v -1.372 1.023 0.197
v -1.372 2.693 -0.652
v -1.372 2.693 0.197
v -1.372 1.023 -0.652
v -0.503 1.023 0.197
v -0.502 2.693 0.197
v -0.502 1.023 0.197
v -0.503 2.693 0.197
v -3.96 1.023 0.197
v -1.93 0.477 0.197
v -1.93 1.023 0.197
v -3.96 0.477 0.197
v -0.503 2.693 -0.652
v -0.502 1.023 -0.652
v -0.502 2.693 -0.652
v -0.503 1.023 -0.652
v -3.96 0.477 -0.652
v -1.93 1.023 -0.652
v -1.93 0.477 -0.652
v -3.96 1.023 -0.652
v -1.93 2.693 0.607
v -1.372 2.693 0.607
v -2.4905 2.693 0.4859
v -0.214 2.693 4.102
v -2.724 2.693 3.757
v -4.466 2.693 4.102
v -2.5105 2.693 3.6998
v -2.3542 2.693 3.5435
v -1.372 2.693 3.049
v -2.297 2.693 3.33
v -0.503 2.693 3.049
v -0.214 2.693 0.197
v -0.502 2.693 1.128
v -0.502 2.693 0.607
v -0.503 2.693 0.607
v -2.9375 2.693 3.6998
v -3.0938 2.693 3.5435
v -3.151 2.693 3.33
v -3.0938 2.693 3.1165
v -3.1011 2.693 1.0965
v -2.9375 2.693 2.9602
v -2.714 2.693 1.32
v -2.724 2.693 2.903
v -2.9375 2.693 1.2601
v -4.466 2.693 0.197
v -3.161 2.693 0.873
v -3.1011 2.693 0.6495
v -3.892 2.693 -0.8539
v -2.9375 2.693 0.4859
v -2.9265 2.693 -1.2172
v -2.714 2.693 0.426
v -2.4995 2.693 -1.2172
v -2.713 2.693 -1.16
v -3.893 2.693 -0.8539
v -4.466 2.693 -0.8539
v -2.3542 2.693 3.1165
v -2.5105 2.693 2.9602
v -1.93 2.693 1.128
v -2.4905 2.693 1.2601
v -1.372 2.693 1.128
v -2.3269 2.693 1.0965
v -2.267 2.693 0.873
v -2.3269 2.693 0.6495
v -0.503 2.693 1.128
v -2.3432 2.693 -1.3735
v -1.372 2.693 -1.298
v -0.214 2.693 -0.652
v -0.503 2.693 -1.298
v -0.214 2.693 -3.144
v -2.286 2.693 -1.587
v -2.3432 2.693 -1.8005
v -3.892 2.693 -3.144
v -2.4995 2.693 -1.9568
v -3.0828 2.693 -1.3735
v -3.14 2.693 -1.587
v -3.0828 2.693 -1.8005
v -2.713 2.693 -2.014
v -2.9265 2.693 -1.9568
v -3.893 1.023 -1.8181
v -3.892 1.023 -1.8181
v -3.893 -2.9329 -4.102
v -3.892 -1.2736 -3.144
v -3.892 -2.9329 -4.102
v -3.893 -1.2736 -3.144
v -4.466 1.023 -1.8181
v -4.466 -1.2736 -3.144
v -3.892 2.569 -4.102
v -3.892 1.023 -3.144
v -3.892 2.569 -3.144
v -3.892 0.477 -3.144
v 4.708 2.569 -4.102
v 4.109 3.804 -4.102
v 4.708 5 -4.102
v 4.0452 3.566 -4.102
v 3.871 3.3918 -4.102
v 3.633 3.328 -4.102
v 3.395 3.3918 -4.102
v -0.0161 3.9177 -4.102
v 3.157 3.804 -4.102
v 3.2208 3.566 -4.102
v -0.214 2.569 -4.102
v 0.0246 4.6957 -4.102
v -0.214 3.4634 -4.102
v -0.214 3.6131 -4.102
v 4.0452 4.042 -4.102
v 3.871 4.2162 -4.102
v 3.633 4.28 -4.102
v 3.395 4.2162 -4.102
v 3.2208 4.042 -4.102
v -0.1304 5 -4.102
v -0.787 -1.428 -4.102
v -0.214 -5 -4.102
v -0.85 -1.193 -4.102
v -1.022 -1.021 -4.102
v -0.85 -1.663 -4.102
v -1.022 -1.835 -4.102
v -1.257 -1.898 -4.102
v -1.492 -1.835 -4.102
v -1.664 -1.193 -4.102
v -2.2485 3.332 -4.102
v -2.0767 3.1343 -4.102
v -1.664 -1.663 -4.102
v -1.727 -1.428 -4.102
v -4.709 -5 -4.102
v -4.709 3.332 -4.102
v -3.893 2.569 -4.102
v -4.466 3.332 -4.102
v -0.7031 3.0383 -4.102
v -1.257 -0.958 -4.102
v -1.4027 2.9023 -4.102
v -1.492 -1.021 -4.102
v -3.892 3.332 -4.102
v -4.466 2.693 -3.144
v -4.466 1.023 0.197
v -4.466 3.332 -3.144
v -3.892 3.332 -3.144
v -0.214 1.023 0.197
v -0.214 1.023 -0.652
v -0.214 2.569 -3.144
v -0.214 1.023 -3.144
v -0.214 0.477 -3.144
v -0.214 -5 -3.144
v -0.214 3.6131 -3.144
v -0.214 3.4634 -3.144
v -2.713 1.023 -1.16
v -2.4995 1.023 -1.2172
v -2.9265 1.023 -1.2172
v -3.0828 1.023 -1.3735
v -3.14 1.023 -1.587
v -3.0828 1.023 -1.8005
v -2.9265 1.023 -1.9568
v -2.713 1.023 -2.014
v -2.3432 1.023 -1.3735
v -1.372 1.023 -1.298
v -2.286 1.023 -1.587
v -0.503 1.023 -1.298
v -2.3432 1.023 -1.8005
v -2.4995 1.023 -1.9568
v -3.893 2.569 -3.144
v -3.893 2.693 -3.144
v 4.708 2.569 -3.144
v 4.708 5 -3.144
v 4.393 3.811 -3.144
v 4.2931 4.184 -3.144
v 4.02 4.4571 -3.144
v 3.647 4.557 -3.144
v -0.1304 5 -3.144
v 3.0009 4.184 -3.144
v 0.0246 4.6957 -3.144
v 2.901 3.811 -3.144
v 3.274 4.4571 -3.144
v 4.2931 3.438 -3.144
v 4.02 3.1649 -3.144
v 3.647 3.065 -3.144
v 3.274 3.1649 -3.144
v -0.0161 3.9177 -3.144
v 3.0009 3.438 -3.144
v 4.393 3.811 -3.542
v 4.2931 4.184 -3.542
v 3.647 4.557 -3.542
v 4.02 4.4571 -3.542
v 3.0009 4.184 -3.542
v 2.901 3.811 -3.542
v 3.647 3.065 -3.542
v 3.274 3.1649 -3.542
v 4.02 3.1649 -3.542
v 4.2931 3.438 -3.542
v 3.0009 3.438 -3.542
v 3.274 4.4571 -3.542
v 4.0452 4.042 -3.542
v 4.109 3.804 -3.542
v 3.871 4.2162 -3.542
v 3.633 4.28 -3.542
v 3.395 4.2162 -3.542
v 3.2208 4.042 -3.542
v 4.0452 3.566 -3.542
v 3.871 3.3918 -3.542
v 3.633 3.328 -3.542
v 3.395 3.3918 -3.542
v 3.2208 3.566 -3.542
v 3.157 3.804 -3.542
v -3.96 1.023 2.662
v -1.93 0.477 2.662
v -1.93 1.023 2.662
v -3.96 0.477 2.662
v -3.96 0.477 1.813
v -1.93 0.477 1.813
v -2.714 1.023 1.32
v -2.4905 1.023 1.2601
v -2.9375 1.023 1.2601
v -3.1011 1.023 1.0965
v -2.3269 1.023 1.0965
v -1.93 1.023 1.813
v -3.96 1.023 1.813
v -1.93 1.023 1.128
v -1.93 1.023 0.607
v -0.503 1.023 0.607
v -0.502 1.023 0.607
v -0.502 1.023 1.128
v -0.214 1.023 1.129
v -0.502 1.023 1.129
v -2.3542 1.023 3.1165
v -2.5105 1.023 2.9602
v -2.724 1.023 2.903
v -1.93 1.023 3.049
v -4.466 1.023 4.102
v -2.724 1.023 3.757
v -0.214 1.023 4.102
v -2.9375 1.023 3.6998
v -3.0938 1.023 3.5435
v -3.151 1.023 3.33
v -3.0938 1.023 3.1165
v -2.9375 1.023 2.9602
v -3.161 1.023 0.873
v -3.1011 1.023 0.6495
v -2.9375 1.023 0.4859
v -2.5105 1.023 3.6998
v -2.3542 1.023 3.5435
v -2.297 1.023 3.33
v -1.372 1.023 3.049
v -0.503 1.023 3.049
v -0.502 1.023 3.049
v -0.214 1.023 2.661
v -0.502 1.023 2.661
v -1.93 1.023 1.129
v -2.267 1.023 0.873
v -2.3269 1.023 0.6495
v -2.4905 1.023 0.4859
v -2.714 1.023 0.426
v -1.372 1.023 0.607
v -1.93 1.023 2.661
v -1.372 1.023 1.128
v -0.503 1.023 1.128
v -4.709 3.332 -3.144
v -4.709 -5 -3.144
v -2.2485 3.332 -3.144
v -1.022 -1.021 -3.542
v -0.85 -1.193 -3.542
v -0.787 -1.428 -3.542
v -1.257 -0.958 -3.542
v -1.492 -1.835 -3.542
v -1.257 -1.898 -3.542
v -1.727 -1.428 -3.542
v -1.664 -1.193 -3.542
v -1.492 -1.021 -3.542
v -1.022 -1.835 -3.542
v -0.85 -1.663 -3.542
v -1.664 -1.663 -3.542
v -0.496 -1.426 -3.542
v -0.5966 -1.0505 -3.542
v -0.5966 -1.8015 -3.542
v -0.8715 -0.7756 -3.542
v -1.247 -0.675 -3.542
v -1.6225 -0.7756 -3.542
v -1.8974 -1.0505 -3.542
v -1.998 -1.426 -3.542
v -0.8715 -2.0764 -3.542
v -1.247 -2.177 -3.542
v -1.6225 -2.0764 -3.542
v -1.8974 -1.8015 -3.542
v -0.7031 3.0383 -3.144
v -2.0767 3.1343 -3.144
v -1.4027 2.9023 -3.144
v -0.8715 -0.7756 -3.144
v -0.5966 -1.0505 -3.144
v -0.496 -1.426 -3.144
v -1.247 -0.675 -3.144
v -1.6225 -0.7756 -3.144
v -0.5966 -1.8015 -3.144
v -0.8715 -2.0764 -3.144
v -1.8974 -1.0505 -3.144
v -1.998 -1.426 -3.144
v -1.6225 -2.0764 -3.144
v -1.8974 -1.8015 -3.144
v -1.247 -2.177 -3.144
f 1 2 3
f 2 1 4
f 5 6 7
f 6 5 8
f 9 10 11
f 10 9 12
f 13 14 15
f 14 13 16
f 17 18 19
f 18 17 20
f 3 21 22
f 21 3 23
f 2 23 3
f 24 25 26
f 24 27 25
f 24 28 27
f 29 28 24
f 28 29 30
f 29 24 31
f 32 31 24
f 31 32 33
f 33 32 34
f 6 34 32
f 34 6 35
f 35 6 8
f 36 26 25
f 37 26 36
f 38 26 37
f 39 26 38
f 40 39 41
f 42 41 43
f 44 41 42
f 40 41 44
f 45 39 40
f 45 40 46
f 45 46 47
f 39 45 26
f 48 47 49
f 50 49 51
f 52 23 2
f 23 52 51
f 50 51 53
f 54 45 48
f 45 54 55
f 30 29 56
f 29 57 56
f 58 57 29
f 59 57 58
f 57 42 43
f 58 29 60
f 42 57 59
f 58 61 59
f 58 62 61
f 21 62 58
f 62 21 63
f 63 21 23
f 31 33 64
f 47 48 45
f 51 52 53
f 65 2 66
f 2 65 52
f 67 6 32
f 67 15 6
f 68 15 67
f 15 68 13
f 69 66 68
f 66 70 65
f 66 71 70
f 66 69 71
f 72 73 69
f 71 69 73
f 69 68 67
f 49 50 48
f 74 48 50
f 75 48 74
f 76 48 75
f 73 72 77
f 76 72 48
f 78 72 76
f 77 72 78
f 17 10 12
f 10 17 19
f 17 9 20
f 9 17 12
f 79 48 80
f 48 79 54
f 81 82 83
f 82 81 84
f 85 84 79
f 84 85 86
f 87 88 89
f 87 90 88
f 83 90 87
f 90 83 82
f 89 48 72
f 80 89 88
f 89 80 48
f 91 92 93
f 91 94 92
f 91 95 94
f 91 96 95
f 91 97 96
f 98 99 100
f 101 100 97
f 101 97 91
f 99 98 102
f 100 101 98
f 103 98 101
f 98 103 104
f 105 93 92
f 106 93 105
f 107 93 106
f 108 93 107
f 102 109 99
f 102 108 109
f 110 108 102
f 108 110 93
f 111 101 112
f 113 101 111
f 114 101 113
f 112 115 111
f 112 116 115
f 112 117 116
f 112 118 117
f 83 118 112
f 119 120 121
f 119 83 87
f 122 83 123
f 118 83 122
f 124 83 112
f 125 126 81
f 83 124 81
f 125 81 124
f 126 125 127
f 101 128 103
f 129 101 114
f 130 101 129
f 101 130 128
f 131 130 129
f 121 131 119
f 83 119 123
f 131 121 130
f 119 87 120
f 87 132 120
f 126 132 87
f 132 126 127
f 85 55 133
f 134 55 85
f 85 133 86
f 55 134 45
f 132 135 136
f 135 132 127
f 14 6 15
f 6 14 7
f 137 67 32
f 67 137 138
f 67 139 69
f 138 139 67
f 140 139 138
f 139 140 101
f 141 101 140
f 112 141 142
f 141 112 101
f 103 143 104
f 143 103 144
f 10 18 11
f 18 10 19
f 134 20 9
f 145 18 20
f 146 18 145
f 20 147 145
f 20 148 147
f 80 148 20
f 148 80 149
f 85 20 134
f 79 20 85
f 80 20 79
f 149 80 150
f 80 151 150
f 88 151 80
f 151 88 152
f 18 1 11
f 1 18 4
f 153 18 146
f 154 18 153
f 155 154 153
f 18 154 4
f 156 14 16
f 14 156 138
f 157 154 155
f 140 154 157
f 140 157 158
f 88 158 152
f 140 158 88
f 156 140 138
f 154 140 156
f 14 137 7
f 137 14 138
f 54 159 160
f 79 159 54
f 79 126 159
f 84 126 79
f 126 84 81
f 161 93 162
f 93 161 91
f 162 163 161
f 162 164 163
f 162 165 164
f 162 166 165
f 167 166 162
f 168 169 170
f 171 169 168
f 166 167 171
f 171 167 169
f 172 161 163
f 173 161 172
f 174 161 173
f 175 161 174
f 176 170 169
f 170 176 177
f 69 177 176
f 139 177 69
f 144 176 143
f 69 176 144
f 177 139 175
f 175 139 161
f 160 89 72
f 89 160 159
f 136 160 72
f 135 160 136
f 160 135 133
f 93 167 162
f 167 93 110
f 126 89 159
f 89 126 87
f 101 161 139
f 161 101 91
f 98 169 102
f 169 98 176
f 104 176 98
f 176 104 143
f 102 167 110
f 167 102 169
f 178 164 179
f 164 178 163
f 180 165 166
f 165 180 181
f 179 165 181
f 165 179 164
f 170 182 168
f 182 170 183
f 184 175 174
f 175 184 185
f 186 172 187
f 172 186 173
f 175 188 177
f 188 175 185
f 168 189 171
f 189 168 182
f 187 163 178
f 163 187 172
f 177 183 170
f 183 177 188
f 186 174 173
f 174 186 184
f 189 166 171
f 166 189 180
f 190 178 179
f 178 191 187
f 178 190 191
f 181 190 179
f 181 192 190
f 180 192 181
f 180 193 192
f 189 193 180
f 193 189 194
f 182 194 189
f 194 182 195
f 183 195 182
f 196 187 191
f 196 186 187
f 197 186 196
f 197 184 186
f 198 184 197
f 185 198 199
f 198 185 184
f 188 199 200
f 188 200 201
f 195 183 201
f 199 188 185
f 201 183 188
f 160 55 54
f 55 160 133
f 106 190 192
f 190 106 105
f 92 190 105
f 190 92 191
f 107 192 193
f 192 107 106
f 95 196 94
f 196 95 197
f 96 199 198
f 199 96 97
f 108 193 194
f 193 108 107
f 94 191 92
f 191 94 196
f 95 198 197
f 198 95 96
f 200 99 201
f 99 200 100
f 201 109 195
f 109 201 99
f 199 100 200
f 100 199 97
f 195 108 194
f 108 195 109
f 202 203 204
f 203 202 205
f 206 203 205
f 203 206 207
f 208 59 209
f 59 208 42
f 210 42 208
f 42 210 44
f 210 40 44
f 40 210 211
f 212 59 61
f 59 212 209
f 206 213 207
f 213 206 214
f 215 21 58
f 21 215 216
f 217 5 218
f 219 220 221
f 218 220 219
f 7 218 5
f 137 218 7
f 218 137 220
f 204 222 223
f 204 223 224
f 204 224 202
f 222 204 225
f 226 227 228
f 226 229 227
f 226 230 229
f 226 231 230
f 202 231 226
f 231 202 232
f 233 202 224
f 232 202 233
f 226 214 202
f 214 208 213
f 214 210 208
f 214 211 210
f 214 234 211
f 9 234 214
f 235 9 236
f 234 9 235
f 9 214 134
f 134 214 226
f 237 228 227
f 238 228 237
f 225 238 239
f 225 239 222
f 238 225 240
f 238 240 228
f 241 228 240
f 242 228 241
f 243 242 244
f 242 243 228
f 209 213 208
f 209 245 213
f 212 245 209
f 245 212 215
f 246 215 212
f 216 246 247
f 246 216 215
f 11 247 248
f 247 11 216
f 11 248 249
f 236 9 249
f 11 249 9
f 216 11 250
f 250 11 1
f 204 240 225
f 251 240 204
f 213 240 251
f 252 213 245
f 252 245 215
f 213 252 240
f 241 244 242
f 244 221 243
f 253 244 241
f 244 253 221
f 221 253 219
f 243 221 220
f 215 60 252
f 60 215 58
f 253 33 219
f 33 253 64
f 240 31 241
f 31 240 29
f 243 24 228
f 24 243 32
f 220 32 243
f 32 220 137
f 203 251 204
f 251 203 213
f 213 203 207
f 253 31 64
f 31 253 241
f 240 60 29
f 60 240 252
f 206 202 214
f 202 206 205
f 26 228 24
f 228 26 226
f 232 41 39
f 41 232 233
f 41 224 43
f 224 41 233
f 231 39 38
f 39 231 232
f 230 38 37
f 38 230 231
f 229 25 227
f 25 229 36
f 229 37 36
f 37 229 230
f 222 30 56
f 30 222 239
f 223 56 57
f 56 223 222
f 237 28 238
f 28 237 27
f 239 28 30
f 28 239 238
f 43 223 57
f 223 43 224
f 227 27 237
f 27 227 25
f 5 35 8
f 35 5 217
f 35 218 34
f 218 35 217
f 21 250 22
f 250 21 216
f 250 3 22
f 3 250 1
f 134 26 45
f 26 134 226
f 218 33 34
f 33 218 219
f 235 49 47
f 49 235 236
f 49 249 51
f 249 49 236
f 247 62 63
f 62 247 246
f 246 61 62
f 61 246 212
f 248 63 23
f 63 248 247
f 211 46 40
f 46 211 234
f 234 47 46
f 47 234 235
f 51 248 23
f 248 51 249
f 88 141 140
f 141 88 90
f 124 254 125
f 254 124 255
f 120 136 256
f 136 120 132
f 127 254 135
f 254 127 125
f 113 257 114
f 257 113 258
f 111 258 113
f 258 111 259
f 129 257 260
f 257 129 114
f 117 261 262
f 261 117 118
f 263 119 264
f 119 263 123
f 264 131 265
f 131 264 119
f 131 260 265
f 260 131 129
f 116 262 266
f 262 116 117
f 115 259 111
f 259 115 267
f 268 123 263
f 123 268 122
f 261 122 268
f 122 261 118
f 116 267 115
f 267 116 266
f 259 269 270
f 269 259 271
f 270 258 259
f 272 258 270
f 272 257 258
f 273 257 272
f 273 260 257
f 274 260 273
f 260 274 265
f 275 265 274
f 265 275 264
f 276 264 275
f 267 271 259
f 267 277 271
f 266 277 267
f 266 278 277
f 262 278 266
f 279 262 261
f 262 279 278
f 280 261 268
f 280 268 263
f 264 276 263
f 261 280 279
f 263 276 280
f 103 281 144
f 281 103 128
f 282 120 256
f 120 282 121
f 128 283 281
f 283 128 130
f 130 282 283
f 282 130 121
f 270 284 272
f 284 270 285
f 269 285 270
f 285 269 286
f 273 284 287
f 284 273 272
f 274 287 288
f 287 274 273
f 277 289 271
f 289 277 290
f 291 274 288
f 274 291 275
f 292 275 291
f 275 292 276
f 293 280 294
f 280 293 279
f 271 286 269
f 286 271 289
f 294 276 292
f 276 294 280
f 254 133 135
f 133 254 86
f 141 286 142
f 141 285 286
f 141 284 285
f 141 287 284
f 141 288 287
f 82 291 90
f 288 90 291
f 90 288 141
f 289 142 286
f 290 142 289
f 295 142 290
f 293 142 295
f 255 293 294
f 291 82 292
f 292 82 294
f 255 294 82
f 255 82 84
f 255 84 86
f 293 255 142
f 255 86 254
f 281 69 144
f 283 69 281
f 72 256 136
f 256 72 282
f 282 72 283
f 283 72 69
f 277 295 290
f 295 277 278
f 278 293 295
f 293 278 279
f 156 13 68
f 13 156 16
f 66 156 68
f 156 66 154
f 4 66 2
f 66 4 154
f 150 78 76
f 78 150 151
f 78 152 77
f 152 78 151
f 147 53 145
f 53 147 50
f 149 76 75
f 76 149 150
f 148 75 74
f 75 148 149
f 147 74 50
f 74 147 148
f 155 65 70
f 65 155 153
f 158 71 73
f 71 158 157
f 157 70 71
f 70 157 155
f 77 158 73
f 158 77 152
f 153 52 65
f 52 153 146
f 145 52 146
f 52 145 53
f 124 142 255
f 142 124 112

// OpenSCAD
intersection() {
translate([-5.65, -6, -4.923]) cube(size = [11.301, 12, 9.846], center = false);
union() {
difference() {
union() {
translate([-0.502, -5, -0.652]) cube(size = [5.211, 7.693, 0.849], center = false);
intersection() {
translate([-18.2, 0.477, -0.652]) cube(size = [16.828, 2.216, 0.849], center = false);
rotate([90, 0, 0])
translate([-3.96, -18.2, -18.2]) cube(size = [22.16, 36.4, 36.4], center = false);
}
rotate([-180, 0, 0])
translate([-0.214, -18.2, 1.298]) cube(size = [18.414, 36.4, 2.804], center = false);
intersection() {
rotate([-150, 0, 0])
translate([-18.2, -18.2, 2.086]) cube(size = [17.986, 36.4, 16.114], center = false);
translate([-4.466, -5, -4.102]) cube(size = [0.574, 8.332, 3.45], center = false);
}
translate([-1.247, -1.426, -18.2])
cylinder(h = 14.098, r1 = 0.751, r2 = 0.751, center = false, $fn = 12);
}
union() {
rotate([180, 0, 180])
translate([-3.647, 3.811, -18.2])
cylinder(h = 21.742, r1 = 0.746, r2 = 0.746, center = false, $fn = 12);
translate([-4.466, 2.693, -3.144]) cube(size = [22.666, 0.639, 2.492], center = false);
translate([3.633, 3.804, -4.102])
cylinder(h = 0.56, r1 = 0.476, r2 = 0.476, center = false, $fn = 12);
difference() {
union() {
rotate([90, 0, 0])
translate([-1.93, -18.2, -1.023]) cube(size = [20.13, 36.4, 19.222], center = false);
rotate([30, 0, 0])
translate([-3.893, -18.2, -18.2]) cube(size = [22.093, 36.4, 16.114], center = false);
}
difference() {
translate([-3.893, 2.569, -18.2]) cube(size = [8.601, 2.431, 15.056], center = false);
rotate([0, 0, 72])
translate([3.721, 2.731, -18.2])
cylinder(h = 36.4, r1 = 1.505, r2 = 1.505, center = false, $fn = 12);
}
}
rotate([-180, 0, 0])
translate([-0.214, -18.2, -0.197]) cube(size = [18.414, 36.4, 3.341], center = false);
}
}
difference() {
union() {
intersection() {
difference() {
translate([-4.466, 0.477, 1.129]) cube(size = [3.095, 17.723, 1.533], center = false);
rotate([180, 90, -90])
translate([-0.873, 2.714, -18.2])
cylinder(h = 36.4, r1 = 0.447, r2 = 0.447, center = false, $fn = 12);
}
union() {
translate([-18.2, 0.477, 1.813]) cube(size = [16.828, 2.216, 1.237], center = false);
rotate([90, 0, 0])
translate([-18.2, -18.2, -2.693]) cube(size = [16.27, 36.4, 1.67], center = false);
}
}
intersection() {
translate([0, 0, 0]) sphere(r = 54.6, $fn = 12);
rotate([180, 90, -90])
translate([-0.873, 2.714, -18.2])
cylinder(h = 18.677, r1 = 0.447, r2 = 0.447, center = false, $fn = 12);
}
intersection() {
rotate([90, 0, 0])
translate([-1.93, -18.2, -2.693]) cube(size = [20.13, 36.4, 1.67], center = false);
rotate([180, 0, 0])
translate([-18.2, -18.2, -3.049]) cube(size = [17.986, 36.4, 1.921], center = false);
}
}
intersection() {
union() {
rotate([90, 0, 0])
translate([-1.93, -18.2, -1.023]) cube(size = [20.13, 36.4, 19.222], center = false);
rotate([90, 0, 0])
translate([-18.2, -18.2, -0.477]) cube(size = [36.4, 36.4, 18.677], center = false);
translate([-1.372, -18.2, 0.197]) cube(size = [0.869, 36.4, 2.853], center = false);
rotate([90, 0, 0])
translate([-18.2, -18.2, -18.2]) cube(size = [14.24, 36.4, 36.4], center = false);
}
translate([0, 0, 0]) sphere(r = 54.6, $fn = 12);
}
}
intersection() {
union() {
intersection() {
difference() {
rotate([180, 0, 0])
translate([-18.2, -18.2, -4.102]) cube(size = [17.986, 36.4, 1.441], center = false);
rotate([0, 90, 90])
translate([-3.33, 2.724, -18.2])
cylinder(h = 36.4, r1 = 0.427, r2 = 0.427, center = false, $fn = 12);
}
union() {
translate([-4.466, 0.477, -18.2]) cube(size = [3.095, 2.216, 20.013], center = false);
rotate([90, 0, 0])
translate([-18.2, -18.2, -18.2]) cube(size = [36.4, 36.4, 36.4], center = false);
}
}
intersection() {
rotate([90, 0, 0])
translate([-18.2, -18.2, -18.2]) cube(size = [14.24, 36.4, 36.4], center = false);
rotate([180, 0, 0])
translate([-18.2, -18.2, -3.049]) cube(size = [17.986, 36.4, 1.921], center = false);
}
difference() {
rotate([180, 0, 0])
translate([-18.2, -18.2, -1.129]) cube(size = [17.986, 36.4, 0.932], center = false);
translate([-1.372, -18.2, 0.197]) cube(size = [0.869, 36.4, 0.41], center = false);
}
}
difference() {
union() {
difference() {
rotate([90, 0, 0])
translate([-18.2, -18.2, -2.693]) cube(size = [16.27, 36.4, 1.67], center = false);
translate([-18.2, -18.2, 1.129]) cube(size = [13.734, 20.893, 17.071], center = false);
}
rotate([90, 0, 0])
translate([-1.93, -18.2, -2.693]) cube(size = [20.13, 36.4, 1.67], center = false);
}
union() {
rotate([180, 90, -90])
translate([-0.873, 2.714, -18.2])
cylinder(h = 20.893, r1 = 0.447, r2 = 0.447, center = false, $fn = 12);
translate([-18.2, 0.477, 0.197]) cube(size = [13.734, 2.216, 0.932], center = false);
difference() {
translate([-18.2, 1.023, 0.607]) cube(size = [17.698, 17.177, 2.442], center = false);
rotate([90, 0, 0])
translate([-18.2, -18.2, -18.2]) cube(size = [16.27, 36.4, 36.4], center = false);
}
}
}
}
intersection() {
difference() {
difference() {
intersection() {
rotate([-180, 0, 0])
translate([-18.2, -18.2, -0.197]) cube(size = [17.986, 36.4, 4.299], center = false);
translate([-18.2, -18.2, -4.102]) cube(size = [22.909, 23.2, 22.302], center = false);
}
union() {
translate([-4.466, 0.477, -3.144]) cube(size = [9.175, 0.546, 3.341], center = false);
translate([-4.709, 3.332, -4.102]) cube(size = [4.206, 1.668, 2.804], center = false);
}
}
union() {
rotate([30, 0, 0])
translate([-4.466, -18.2, -18.2]) cube(size = [0.574, 36.4, 16.114], center = false);
rotate([0, 0, 0])
translate([-1.257, -1.428, -18.2])
cylinder(h = 14.658, r1 = 0.47, r2 = 0.47, center = false, $fn = 12);
rotate([0, 0, -64])
translate([-4.416, 0.7, -18.2])
cylinder(h = 36.4, r1 = 1.377, r2 = 1.377, center = false, $fn = 12);
translate([-1.247, -1.426, -3.542])
cylinder(h = 0.398, r1 = 0.751, r2 = 0.751, center = false, $fn = 12);
}
}
union() {
translate([-4.466, 1.023, -0.652]) cube(size = [0.574, 1.67, 18.852], center = false);
translate([-4.709, -5, -4.102]) cube(size = [22.909, 23.2, 0.958], center = false);
difference() {
difference() {
translate([-4.466, 0.477, -3.144]) cube(size = [9.175, 2.216, 2.492], center = false);
translate([-1.372, 0.477, -1.298]) cube(size = [0.869, 4.523, 0.646], center = false);
}
rotate([180, 90, -90])
translate([1.587, 2.713, -18.2])
cylinder(h = 36.4, r1 = 0.427, r2 = 0.427, center = false, $fn = 12);
}
}
}
}
}
